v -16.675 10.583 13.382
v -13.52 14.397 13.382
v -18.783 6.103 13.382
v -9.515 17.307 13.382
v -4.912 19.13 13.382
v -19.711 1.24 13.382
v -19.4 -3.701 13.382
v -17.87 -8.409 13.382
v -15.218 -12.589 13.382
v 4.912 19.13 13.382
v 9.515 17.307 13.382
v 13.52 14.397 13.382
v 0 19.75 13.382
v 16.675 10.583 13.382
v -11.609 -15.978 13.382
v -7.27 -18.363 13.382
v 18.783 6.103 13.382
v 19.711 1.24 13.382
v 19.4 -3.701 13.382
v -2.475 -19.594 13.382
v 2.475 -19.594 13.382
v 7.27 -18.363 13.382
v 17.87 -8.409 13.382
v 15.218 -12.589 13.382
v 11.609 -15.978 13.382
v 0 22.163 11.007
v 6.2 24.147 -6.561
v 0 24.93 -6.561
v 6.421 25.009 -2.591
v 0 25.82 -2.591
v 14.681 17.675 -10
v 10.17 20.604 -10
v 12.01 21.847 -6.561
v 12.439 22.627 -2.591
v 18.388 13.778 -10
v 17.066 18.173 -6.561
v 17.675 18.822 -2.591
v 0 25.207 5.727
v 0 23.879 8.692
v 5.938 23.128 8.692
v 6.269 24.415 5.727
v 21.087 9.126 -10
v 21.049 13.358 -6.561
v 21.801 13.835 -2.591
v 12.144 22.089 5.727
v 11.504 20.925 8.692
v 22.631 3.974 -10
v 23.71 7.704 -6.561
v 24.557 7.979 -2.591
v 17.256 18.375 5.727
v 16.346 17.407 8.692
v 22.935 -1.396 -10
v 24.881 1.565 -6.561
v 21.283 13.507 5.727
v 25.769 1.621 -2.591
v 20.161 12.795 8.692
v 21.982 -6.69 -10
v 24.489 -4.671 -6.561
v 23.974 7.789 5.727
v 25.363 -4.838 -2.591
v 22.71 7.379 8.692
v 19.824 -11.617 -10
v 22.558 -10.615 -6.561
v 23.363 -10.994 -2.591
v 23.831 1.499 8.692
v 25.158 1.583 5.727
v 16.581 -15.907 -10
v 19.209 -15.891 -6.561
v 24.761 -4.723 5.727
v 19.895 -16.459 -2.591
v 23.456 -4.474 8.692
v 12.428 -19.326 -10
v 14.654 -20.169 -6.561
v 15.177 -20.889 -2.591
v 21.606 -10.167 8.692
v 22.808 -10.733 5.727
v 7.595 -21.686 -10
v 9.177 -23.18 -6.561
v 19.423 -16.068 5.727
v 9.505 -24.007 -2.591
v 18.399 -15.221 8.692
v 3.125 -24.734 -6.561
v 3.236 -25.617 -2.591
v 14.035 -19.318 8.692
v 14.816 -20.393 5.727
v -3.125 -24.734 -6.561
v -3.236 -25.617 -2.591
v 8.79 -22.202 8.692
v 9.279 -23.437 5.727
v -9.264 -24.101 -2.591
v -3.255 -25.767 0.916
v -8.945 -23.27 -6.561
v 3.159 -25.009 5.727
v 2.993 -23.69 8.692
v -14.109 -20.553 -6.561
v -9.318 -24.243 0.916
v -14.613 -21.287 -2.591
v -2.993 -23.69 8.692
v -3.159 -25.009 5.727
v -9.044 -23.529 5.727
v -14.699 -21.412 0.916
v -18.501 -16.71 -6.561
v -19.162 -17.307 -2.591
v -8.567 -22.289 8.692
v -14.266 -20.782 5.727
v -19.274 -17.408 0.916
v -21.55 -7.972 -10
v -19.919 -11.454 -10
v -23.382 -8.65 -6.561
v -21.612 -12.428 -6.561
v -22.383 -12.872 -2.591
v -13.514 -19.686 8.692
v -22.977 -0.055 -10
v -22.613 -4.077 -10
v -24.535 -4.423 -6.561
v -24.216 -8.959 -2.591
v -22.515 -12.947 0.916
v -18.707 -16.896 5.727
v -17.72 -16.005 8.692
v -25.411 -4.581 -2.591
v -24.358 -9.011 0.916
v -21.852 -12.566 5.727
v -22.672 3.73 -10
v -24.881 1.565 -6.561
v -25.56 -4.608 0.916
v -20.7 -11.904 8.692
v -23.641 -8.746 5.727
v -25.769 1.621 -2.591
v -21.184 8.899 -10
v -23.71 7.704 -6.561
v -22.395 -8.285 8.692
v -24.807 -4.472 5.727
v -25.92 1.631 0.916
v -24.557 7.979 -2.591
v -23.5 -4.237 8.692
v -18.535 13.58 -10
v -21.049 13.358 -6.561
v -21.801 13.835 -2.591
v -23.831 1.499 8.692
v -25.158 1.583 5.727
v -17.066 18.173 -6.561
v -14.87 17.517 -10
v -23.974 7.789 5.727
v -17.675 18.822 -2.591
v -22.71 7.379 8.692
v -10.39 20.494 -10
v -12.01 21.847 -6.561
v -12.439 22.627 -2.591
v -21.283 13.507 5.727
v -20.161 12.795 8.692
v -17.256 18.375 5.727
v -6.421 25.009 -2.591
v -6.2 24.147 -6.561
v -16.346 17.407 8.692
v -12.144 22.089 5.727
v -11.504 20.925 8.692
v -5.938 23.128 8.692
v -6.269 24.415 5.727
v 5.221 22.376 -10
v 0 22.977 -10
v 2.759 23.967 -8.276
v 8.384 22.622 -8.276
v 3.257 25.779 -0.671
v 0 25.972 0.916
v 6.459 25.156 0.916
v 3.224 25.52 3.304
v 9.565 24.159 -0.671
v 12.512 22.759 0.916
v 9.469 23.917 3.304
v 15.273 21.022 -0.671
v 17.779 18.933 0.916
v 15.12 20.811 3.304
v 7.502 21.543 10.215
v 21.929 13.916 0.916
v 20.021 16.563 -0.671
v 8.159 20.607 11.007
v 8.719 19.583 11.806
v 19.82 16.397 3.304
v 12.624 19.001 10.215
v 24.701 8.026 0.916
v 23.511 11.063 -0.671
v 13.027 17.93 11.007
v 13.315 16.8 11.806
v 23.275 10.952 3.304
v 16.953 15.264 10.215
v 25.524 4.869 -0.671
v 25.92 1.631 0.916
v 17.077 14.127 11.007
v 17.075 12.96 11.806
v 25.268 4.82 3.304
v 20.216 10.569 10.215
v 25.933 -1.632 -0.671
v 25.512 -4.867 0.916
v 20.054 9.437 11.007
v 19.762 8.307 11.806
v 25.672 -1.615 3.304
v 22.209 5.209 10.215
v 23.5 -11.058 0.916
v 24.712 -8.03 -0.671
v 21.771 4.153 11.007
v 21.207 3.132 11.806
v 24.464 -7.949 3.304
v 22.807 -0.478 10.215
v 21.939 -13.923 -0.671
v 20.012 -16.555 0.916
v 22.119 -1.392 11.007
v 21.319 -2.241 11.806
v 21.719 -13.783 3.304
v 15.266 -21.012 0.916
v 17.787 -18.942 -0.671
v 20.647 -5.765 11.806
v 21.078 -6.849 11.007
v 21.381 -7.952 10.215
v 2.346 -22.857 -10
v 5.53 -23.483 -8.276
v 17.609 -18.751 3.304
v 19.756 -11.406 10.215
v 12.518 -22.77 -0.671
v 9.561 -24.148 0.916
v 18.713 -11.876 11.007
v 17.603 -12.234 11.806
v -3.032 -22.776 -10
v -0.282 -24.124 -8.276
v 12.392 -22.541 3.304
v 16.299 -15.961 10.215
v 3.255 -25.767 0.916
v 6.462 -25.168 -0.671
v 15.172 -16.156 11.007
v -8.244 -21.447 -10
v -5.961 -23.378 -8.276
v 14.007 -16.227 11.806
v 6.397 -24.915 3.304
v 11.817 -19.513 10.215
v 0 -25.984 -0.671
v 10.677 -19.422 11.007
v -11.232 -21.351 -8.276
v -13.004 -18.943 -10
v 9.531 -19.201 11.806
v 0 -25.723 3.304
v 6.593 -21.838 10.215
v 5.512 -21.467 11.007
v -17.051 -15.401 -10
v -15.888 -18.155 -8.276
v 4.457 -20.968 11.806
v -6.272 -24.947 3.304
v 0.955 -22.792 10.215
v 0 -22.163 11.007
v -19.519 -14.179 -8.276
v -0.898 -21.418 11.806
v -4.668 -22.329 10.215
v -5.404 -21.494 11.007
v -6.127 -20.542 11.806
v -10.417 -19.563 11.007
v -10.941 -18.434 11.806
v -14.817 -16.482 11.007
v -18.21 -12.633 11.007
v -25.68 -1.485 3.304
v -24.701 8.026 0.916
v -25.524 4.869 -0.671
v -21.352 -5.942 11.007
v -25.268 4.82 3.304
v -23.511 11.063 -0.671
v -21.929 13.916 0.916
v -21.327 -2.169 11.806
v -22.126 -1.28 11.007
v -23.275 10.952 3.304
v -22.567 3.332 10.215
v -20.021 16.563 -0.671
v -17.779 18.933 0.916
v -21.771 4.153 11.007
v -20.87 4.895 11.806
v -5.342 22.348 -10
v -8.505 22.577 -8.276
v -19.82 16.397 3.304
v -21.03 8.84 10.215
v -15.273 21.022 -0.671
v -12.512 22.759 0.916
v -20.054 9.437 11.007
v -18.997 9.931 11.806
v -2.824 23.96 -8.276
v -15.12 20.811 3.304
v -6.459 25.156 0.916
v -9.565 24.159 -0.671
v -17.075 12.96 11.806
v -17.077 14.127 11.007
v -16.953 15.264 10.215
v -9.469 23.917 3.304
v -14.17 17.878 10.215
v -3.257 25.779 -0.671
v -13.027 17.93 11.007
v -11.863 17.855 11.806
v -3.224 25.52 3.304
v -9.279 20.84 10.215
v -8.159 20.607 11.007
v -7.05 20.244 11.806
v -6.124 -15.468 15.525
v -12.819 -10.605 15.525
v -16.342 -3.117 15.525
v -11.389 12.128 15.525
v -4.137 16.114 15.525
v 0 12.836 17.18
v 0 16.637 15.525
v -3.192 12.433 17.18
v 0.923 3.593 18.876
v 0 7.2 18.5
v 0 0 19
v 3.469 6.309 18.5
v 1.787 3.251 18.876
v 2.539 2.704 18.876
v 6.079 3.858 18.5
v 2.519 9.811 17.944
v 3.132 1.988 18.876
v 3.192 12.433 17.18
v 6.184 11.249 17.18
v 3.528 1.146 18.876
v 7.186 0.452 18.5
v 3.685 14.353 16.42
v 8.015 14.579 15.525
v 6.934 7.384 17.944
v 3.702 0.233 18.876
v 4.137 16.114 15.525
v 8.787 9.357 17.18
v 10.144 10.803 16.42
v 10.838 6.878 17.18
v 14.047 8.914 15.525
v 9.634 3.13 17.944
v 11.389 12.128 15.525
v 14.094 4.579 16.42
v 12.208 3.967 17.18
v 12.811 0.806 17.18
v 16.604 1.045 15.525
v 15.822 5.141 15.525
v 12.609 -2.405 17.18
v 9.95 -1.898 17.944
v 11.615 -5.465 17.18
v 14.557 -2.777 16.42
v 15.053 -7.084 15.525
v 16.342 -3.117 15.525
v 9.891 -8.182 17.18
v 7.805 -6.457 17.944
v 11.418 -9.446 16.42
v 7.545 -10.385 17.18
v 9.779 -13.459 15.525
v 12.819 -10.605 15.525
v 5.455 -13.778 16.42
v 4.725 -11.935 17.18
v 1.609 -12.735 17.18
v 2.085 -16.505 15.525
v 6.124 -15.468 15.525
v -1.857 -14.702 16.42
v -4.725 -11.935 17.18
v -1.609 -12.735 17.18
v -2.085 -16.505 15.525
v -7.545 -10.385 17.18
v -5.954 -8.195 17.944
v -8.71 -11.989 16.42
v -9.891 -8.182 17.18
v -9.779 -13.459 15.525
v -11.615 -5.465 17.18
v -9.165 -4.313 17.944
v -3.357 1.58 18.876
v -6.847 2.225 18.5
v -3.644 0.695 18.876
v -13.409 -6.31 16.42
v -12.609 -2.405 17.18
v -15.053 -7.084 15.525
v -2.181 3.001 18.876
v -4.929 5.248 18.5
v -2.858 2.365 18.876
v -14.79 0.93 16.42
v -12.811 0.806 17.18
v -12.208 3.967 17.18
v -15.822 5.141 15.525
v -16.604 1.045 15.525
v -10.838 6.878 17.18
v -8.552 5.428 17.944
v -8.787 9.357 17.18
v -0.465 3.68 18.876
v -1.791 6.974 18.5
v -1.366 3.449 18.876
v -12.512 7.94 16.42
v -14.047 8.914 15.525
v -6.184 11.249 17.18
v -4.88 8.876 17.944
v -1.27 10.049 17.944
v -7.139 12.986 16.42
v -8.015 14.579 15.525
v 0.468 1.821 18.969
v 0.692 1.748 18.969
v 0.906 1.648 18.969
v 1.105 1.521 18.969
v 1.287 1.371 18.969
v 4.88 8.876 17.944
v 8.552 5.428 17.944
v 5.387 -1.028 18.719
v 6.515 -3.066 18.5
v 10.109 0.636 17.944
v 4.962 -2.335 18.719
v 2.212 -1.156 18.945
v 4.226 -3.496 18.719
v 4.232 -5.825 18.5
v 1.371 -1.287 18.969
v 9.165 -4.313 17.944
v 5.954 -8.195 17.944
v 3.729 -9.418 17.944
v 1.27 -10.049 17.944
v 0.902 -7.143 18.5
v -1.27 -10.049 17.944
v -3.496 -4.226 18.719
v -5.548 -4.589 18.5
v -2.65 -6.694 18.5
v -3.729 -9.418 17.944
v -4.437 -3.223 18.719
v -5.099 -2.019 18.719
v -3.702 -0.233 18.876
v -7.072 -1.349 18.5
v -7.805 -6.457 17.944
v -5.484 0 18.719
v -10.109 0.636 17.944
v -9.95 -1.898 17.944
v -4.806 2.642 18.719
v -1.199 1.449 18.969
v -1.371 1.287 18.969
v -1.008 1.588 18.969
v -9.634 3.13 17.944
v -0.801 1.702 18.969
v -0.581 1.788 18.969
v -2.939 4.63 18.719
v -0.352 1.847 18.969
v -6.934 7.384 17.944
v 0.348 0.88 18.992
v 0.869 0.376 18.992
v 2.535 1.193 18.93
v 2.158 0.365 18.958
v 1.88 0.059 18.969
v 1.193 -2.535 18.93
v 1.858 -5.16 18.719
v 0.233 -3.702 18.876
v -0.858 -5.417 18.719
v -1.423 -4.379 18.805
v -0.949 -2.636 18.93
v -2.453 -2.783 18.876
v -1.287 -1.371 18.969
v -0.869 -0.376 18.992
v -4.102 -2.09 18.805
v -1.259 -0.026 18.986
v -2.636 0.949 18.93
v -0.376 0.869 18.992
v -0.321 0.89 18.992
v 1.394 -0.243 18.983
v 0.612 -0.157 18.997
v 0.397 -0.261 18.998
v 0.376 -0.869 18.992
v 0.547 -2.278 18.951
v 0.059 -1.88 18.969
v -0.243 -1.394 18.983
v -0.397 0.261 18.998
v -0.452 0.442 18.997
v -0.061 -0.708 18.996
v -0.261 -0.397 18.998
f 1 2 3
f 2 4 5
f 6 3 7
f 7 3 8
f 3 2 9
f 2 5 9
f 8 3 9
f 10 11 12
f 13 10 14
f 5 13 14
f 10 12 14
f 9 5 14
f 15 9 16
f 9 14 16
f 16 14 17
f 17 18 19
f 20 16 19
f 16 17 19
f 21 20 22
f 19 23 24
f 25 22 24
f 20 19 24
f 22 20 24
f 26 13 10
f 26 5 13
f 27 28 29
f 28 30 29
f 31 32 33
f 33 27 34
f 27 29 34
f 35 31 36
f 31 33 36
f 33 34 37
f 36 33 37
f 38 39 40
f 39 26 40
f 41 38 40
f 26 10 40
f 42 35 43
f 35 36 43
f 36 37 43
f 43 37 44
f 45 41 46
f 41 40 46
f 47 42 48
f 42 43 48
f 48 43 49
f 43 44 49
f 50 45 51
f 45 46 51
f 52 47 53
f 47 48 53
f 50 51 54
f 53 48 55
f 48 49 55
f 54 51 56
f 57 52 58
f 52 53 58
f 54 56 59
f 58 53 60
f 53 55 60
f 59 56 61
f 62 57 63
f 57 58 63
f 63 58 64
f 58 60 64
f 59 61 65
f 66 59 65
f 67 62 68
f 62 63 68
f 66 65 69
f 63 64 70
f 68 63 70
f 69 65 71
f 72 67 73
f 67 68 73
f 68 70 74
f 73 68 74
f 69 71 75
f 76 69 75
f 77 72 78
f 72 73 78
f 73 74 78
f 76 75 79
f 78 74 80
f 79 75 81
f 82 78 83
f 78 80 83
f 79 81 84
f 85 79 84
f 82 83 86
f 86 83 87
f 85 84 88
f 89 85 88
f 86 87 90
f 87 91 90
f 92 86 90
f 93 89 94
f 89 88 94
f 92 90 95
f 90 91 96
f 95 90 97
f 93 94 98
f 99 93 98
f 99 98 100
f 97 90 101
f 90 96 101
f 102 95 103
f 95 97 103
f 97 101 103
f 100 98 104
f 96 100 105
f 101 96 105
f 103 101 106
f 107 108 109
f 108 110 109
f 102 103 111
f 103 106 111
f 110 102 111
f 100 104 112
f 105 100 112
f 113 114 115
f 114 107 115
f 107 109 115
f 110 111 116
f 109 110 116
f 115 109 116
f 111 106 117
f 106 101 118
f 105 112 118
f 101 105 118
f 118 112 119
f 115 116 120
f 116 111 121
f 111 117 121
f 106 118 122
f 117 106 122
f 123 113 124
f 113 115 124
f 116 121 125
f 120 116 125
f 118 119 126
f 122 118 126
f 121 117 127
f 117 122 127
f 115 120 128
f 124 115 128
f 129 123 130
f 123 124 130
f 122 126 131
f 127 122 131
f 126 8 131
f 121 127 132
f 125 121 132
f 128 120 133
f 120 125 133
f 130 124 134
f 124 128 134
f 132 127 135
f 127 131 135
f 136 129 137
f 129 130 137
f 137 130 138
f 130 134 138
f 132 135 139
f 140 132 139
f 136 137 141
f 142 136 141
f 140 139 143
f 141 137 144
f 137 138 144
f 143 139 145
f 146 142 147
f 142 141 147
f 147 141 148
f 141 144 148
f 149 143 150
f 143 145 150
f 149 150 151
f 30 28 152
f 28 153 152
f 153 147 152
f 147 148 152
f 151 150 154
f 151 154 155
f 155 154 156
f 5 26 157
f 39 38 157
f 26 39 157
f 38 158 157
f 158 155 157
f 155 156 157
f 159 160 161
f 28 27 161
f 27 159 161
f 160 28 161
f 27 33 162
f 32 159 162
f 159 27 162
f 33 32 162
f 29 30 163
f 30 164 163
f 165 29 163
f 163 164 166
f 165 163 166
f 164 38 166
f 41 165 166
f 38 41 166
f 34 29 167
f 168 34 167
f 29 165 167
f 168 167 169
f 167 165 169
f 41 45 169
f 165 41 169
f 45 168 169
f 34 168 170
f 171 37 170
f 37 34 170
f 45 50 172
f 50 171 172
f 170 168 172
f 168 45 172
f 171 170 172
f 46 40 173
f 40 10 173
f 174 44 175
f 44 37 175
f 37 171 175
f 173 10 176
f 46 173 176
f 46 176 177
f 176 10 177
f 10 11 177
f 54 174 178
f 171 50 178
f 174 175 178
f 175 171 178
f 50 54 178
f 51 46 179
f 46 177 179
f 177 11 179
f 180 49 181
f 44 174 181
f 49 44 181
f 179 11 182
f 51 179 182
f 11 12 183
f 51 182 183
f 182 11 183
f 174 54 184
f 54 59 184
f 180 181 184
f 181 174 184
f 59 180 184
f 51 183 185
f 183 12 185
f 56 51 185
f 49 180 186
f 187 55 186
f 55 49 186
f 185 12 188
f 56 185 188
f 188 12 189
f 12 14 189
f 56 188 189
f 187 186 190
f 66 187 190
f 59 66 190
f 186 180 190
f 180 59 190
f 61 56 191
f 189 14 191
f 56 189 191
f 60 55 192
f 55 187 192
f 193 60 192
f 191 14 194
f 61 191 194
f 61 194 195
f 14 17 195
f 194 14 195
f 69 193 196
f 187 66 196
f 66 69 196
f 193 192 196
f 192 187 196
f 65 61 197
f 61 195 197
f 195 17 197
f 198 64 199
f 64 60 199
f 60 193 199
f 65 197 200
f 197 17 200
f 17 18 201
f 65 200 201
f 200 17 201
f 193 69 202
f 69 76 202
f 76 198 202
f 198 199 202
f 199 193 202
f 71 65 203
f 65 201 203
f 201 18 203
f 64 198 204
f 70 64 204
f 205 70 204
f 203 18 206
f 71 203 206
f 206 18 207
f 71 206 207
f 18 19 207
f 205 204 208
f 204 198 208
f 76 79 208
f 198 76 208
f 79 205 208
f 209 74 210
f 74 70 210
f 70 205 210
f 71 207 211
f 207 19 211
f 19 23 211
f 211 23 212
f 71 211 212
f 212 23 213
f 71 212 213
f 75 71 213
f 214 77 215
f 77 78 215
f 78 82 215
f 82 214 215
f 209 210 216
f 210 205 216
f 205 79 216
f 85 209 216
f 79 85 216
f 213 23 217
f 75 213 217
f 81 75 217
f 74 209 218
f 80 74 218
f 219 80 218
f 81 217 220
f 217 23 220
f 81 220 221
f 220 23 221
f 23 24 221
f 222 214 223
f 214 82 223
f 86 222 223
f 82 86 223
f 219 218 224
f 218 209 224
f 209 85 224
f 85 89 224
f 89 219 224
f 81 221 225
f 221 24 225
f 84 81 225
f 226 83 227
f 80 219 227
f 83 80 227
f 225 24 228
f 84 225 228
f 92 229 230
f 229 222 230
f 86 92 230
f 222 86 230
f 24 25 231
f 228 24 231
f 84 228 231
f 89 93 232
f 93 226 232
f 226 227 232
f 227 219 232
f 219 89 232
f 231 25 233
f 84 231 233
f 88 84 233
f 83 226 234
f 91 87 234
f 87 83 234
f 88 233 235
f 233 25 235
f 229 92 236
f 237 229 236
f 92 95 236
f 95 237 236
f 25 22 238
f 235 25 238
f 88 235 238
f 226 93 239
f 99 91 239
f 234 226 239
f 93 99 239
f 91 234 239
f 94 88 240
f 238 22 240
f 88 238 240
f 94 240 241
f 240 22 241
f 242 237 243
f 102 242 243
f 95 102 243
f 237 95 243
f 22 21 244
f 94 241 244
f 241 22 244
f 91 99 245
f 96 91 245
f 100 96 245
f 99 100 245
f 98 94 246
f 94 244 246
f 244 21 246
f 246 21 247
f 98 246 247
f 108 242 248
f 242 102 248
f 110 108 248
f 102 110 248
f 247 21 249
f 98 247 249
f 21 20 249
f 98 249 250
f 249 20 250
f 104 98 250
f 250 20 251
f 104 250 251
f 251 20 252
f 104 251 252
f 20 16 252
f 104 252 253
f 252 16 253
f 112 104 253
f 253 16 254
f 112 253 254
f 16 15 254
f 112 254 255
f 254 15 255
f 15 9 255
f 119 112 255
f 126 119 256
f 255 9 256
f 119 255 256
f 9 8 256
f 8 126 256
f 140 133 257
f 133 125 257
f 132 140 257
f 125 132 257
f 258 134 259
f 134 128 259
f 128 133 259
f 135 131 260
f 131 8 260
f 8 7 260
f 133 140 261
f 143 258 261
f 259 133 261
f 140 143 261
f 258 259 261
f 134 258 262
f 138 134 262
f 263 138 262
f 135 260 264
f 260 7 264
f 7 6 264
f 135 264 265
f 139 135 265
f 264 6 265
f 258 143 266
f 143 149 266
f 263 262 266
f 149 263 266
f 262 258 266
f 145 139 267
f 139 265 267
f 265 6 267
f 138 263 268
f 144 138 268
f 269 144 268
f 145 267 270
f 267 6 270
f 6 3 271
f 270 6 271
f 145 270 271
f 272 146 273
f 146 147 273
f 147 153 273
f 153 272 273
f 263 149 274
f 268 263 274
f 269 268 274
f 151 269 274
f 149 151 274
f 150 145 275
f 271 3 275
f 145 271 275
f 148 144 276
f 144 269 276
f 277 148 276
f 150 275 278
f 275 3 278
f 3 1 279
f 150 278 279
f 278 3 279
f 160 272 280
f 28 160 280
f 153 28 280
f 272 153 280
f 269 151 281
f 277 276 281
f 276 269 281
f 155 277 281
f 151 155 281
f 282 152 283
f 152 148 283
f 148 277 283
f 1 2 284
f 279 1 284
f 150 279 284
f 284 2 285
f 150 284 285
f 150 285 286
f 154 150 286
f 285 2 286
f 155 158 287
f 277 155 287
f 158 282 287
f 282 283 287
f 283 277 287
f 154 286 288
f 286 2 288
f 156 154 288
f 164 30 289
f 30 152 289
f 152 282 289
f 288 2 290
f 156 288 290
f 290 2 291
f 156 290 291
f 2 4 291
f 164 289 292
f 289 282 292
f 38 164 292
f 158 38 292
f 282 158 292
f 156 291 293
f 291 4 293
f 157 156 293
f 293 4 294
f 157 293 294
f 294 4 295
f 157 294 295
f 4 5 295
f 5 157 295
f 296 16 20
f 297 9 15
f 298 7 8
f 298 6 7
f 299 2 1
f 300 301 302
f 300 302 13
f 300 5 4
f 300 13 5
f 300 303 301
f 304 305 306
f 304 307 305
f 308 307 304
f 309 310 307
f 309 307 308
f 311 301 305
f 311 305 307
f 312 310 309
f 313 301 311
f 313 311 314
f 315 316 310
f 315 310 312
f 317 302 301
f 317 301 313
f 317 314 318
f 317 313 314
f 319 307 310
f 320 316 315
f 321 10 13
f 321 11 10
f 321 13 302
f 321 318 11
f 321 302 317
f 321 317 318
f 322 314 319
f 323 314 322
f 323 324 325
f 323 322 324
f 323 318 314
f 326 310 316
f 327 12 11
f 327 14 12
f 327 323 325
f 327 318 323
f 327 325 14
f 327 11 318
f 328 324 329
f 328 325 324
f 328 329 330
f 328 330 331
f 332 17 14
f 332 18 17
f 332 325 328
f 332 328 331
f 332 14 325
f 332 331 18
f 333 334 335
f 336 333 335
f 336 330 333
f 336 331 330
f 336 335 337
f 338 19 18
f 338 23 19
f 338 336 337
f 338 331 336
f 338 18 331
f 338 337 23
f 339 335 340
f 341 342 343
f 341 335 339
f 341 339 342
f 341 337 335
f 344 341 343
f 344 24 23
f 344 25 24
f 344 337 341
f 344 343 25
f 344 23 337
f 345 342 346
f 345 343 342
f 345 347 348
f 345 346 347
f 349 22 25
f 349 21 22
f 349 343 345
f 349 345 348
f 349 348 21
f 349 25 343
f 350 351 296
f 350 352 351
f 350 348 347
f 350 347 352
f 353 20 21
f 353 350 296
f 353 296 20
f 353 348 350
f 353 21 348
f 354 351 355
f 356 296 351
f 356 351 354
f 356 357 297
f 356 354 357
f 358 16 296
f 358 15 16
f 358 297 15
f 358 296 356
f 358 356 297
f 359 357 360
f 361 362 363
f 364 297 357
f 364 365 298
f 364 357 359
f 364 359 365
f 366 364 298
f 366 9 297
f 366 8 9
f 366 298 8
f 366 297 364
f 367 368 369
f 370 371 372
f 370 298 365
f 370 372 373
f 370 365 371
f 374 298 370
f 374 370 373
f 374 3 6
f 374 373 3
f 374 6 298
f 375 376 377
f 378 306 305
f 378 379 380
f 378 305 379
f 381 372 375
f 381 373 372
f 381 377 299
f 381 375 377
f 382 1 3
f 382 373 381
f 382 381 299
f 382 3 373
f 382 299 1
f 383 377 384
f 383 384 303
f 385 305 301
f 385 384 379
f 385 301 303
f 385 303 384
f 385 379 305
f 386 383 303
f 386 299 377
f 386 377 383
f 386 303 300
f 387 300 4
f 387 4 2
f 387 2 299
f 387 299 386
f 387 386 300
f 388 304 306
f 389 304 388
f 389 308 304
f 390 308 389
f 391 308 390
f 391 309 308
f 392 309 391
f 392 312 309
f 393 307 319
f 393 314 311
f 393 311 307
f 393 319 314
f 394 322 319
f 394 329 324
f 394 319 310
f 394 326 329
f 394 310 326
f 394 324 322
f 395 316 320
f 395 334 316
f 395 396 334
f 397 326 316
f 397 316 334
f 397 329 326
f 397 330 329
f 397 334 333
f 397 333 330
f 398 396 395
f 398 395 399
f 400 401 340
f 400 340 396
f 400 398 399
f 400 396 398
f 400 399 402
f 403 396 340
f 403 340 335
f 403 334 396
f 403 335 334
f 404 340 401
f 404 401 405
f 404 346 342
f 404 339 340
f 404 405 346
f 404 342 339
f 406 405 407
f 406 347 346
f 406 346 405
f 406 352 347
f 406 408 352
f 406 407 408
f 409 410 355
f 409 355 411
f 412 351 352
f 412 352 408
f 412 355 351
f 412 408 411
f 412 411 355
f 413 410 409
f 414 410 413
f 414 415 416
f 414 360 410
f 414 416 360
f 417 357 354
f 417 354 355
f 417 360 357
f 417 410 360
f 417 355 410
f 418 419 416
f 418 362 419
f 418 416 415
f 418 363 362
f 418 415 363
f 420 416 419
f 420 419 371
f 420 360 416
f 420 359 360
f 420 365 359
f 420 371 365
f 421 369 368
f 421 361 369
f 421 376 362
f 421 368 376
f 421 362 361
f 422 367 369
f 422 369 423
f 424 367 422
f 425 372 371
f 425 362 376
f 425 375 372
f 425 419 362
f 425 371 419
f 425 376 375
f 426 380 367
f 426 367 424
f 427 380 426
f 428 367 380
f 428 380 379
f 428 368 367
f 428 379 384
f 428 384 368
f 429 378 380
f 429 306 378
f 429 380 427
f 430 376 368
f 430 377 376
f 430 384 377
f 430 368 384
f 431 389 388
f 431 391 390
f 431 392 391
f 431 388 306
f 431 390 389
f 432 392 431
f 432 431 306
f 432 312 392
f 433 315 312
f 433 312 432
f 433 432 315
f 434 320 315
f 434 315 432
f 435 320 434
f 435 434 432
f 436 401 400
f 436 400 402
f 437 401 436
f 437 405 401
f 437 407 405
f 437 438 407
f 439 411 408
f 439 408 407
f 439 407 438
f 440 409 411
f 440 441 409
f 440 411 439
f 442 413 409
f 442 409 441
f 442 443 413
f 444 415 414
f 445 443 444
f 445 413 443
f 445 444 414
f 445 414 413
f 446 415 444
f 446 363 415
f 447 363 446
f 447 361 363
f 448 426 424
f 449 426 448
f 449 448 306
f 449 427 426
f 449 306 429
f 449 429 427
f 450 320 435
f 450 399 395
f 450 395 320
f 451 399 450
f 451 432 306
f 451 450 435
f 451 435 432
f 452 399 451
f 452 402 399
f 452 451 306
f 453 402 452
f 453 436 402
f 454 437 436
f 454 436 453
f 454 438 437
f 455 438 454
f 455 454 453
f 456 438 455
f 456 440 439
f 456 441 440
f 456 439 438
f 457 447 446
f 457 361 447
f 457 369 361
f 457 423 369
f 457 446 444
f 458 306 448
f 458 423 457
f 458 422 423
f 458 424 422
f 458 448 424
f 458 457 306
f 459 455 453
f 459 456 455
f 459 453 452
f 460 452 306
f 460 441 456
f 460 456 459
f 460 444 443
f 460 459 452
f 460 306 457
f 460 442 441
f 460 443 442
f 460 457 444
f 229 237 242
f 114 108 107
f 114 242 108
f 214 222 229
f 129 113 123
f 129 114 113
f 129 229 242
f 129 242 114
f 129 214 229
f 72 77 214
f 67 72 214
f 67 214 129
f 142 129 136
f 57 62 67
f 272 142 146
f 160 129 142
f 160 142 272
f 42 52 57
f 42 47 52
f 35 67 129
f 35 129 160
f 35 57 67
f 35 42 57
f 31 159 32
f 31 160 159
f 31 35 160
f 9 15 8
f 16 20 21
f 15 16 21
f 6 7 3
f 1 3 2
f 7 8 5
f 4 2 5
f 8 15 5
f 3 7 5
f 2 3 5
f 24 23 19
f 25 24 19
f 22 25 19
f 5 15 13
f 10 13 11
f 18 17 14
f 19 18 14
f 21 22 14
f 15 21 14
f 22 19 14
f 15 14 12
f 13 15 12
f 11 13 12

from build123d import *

# Parameters (mm, degrees)
F3_W     = 95.771608833
F3_H     = 47.5379661864
F4_DEPTH = 25


with BuildPart() as f1:
    # F0 (on Right) → F1 (revolve)
    with BuildSketch(Plane.YZ):
        with BuildLine():
            add(Edge.make_bspline(
                [(19.75, 13.3821831615), (21.237399666, 12.1393060117), (23.8659873685, 9.1534115663), (25.6144415243, 5.3592672006), (26, 1.2190777273), (26, 0)],
                knots=[0.4554507581, 0.4554507581, 0.4554507581, 0.4554507581, 0.6135549385, 0.806628053, 1, 1, 1, 1], degree=3))
            Line((19.75, 13.3821831615), (0, 13.3821831615))
            Line((0, 13.3821831615), (0, -19))
            add(Edge.make_bspline(
                [(0, -19), (6.5746450142, -19), (16.5024296504, -17.0796823909), (23.5392256752, -9.8624842254), (25.6144415243, -5.3592672006), (26, -1.2190777273), (26, 0)],
                knots=[0, 0, 0, 0, 0.3536821005, 0.6135549385, 0.806628053, 1, 1, 1, 1], degree=3))
        make_face()
    revolve(axis=Axis((0, 0, 0), (0, 0, -1)))

    # F3 (on Right) → F4 (cut, symmetric)
    with BuildSketch(Plane.YZ):
        with Locations((5.4435413331, -33.7689830932)):
            Rectangle(F3_W, F3_H)
    extrude(amount=F4_DEPTH, both=True, mode=Mode.SUBTRACT)


with BuildPart() as f2:
    # F0 (on Right) → F2 (revolve)
    with BuildSketch(Plane.YZ):
        with BuildLine():
            add(Edge.make_bspline(
                [(0, 19), (6.5746450142, 19), (13.9441840001, 17.5745202979), (18.7925890888, 14.1821995739), (19.75, 13.3821831615)],
                knots=[0, 0, 0, 0, 0.3536821005, 0.4554507581, 0.4554507581, 0.4554507581, 0.4554507581], degree=3))
            Line((0, 19), (0, 13.3821831615))
            Line((0, 13.3821831615), (19.75, 13.3821831615))
        make_face()
    revolve(axis=Axis((0, 0, 0), (0, 0, -1)))


solid = Compound([f1.part, f2.part])
